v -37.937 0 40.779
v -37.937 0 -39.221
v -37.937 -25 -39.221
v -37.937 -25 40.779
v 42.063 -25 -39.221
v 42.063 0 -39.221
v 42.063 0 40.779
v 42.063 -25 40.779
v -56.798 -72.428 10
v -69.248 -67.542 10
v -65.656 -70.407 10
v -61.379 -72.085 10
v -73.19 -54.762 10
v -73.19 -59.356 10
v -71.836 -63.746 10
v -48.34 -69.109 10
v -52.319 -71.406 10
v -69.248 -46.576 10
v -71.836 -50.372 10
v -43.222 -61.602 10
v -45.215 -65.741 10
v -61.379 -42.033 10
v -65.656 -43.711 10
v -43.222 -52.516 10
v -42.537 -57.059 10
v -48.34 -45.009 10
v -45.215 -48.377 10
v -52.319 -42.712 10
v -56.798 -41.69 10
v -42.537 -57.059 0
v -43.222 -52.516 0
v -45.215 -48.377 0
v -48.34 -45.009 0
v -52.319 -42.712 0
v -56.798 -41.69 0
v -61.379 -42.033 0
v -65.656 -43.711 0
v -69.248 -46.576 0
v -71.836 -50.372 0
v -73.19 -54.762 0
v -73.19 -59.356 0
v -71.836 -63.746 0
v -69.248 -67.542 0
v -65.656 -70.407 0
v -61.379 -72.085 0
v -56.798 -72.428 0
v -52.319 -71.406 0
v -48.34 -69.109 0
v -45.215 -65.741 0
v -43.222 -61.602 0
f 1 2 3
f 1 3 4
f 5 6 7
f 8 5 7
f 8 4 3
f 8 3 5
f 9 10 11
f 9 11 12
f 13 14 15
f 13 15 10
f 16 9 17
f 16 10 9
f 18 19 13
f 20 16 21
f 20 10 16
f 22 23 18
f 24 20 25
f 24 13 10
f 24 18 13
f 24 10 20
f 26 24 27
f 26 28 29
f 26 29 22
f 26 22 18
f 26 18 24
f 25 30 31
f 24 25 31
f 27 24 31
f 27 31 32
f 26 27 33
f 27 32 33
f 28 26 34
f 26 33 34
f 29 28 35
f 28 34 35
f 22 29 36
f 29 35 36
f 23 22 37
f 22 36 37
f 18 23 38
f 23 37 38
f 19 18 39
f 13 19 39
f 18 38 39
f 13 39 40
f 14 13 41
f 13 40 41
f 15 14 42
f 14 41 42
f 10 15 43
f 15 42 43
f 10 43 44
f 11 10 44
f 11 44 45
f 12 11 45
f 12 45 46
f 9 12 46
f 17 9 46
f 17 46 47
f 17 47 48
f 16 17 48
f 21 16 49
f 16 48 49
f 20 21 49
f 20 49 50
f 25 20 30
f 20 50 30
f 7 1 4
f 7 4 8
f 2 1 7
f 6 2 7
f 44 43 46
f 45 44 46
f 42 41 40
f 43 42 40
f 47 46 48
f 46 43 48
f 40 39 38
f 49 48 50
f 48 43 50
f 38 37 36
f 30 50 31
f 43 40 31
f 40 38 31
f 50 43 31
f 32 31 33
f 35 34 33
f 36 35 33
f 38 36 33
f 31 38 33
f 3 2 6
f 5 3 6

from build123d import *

# Parameters (mm, degrees)
F0_W     = 80
F0_H     = 80
F1_DEPTH = 25
F2_R     = 15.412559
F3_DEPTH = 10


with BuildPart() as f1:
    # F0 (on Front) → F1 (new body)
    with BuildSketch(Plane.XZ):
        with Locations((2.062996, 0.77941)):
            Rectangle(F0_W, F0_H)
    extrude(amount=F1_DEPTH)


with BuildPart() as f3:
    # F2 (on Top) → F3 (new body)
    with BuildSketch(Plane.XY):
        with Locations((-57.949405, -57.059009)):
            Circle(F2_R)
    extrude(amount=F3_DEPTH)


solid = Compound([f1.part, f3.part])
